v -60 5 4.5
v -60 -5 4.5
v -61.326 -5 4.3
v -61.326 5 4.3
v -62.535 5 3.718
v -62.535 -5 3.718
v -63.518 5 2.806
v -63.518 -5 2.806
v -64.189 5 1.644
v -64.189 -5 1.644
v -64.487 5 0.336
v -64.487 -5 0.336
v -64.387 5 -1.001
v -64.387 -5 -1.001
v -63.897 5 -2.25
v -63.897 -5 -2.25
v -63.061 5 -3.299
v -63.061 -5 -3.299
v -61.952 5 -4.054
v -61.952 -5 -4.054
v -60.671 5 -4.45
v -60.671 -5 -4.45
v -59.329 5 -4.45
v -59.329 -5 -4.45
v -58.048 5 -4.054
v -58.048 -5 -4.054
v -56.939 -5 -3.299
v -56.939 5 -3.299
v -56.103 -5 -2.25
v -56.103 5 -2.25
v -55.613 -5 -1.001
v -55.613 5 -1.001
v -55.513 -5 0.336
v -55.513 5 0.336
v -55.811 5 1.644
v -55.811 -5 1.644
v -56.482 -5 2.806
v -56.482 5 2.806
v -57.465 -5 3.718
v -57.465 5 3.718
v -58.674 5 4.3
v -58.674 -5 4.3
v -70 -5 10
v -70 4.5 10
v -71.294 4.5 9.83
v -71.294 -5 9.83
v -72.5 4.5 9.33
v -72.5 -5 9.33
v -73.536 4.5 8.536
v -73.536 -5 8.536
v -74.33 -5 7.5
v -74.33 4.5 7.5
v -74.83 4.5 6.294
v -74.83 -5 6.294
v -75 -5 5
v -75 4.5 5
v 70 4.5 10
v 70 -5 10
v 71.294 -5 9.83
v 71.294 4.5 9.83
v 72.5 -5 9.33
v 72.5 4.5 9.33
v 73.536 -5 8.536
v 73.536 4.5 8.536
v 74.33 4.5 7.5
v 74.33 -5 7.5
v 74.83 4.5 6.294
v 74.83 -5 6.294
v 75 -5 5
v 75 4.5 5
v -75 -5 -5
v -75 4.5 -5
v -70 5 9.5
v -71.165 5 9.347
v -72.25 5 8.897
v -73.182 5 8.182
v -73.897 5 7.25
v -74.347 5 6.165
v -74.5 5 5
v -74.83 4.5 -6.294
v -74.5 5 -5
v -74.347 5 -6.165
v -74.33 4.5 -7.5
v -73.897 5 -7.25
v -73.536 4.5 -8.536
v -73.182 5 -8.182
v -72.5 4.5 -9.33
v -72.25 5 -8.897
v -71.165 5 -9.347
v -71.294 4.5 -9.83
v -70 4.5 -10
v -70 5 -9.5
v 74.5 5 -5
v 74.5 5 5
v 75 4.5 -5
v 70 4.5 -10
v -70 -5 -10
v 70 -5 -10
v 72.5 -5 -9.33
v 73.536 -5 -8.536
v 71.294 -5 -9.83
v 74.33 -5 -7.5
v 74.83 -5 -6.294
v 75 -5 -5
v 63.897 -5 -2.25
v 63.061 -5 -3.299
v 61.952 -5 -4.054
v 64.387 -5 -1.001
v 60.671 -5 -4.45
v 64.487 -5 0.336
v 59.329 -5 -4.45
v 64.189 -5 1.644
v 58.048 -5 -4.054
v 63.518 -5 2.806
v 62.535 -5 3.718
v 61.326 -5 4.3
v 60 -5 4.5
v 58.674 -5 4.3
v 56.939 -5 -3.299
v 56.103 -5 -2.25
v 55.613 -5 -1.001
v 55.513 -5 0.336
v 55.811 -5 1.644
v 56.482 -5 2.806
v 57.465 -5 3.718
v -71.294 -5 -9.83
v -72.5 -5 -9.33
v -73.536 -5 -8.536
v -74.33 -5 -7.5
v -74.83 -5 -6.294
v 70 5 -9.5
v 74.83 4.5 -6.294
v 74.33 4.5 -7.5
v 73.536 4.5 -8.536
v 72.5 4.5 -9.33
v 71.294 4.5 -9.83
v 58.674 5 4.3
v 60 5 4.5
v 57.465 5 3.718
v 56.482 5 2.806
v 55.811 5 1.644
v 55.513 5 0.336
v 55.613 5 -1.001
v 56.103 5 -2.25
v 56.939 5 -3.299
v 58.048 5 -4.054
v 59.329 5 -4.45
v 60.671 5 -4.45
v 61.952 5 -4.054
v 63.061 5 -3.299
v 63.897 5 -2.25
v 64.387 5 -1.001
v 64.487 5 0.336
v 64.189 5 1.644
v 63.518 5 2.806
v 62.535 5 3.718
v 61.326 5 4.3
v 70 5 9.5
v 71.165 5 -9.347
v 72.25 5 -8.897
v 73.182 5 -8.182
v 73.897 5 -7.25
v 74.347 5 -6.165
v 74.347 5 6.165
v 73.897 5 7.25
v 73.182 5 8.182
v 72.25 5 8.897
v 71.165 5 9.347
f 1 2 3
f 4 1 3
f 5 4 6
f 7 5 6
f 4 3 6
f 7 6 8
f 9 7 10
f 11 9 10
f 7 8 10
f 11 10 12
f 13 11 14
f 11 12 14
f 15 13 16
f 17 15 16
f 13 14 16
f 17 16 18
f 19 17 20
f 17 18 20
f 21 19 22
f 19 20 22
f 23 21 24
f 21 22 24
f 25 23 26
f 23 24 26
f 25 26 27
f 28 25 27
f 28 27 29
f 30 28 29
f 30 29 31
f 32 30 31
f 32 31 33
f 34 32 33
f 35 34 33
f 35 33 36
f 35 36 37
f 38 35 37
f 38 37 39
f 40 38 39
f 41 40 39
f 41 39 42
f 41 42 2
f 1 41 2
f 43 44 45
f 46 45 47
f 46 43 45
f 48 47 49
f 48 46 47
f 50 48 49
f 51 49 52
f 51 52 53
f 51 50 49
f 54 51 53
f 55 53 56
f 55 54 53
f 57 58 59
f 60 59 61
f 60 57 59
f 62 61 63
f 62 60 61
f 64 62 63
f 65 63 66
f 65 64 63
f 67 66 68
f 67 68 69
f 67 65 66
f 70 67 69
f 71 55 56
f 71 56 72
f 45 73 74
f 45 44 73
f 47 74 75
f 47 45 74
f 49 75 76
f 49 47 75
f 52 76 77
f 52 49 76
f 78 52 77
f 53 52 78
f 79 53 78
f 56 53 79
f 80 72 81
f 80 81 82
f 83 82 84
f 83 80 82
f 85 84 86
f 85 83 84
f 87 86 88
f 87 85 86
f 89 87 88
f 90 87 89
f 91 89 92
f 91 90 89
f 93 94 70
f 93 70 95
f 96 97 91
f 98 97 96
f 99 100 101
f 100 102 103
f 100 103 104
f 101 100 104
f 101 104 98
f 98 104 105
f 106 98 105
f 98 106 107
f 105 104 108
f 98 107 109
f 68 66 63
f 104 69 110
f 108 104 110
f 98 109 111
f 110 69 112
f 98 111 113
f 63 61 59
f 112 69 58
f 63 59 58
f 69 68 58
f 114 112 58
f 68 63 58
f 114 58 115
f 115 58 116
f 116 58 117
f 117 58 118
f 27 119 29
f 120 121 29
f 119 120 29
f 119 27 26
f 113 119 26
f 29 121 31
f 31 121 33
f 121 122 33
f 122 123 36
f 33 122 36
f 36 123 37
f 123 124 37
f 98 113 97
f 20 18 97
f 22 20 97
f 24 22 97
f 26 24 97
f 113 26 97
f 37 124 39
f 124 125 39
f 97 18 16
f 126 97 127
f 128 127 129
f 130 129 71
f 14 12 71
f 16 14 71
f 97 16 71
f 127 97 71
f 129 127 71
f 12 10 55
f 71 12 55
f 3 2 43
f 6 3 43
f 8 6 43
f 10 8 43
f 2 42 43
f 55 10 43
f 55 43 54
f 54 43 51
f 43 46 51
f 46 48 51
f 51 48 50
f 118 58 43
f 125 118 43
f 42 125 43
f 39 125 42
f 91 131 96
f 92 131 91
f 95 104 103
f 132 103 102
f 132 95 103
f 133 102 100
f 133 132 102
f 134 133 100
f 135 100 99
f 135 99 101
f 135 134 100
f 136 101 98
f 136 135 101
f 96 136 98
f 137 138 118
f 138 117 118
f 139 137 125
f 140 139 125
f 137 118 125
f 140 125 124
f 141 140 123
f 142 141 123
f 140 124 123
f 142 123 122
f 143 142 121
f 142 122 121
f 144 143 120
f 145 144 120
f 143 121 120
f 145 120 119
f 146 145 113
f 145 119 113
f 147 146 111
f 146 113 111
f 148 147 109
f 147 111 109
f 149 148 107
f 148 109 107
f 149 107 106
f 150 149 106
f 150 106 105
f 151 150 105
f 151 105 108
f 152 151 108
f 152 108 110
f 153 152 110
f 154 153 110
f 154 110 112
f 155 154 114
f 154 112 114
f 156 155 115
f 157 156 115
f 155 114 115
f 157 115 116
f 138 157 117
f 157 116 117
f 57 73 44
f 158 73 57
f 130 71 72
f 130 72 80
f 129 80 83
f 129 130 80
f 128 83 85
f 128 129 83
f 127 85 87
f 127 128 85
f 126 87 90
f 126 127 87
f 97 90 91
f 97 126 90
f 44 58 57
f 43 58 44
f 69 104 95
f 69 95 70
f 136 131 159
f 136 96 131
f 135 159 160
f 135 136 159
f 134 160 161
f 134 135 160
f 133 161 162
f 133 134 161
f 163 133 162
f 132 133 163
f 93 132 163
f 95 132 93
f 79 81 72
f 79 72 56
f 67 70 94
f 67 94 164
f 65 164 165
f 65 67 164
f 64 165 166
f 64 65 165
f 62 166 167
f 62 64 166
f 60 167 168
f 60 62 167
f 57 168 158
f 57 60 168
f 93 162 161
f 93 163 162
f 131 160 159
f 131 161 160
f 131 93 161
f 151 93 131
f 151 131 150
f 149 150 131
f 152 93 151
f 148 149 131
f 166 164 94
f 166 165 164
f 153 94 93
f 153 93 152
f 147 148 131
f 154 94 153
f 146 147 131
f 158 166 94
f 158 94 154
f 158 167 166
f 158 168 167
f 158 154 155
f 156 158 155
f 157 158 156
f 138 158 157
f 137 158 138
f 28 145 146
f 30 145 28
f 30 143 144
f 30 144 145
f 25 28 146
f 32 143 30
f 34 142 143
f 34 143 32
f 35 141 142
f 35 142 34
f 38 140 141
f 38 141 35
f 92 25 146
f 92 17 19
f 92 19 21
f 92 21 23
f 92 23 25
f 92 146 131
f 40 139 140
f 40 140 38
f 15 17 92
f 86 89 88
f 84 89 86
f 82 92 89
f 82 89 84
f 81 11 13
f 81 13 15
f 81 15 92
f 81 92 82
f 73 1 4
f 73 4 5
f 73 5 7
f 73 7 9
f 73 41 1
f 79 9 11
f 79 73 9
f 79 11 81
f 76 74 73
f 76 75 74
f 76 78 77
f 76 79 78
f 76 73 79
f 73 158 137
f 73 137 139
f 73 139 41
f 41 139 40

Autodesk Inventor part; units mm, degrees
ref_plane "YZ Plane" through (0, 0, 0) normal (1, 0, 0) x (0, 1, 0)
ref_plane "XZ Plane" through (0, 0, 0) normal (0, 1, 0) x (-1, 0, 0)
ref_plane "XY Plane" through (0, 0, 0) normal (0, 0, 1) x (1, 0, 0)
sketch "Sketch1" plane through (0, 0, 0) normal (0, 1, 0) x (-1, 0, 0)
  line L0 (-75, 10) -> (75, 10)
  line L1 (75, 10) -> (75, -10)
  line L2 (75, -10) -> (-75, -10)
  line L3 (-75, -10) -> (-75, 10)
  line L4 (-75, 10) -> (75, -10) construction
  line L5 (75, 10) -> (-75, -10) construction
  point P0 (0, 0)
  dimension "Length" = 150
  dimension "Width" = 20
extrude "Extrusion1" add sketch "Sketch1" along normal mid plane 10
sketch "Sketch4" plane through (0, 5, 0) normal (0, 1, 0) x (1, 0, 0)
  point P0 (0, 0)
  point P1 (-60, 0)
  point P2 (60, 0)
  dimension "d16" = 120
  dimension "d17" = 60
hole "Hole2" at (-60, 5, 0) at (60, 5, 0) direction (0, -1, 0) diameter 9 end through all
fillet "Fillet1" radius 5 4 edges at (75, 0, 10) (75, 0, -10) (-75, 0, 10) (-75, 0, -10)
chamfer "Chamfer2" distance 0.5 angle 45 8 edges at (0, 5, 10) (73.5355, 5, 8.5355) (75, 5, 0) (73.5355, 5, -8.5355) (0, 5, -10) (-73.5355, 5, -8.5355) (-75, 5, 0) (-73.5355, 5, 8.5355)
equation "\"d17\" = 0.5 * d16"
properties part number "Lower Arm Brass Plate - 3" material "Brass, Soft Yellow"
